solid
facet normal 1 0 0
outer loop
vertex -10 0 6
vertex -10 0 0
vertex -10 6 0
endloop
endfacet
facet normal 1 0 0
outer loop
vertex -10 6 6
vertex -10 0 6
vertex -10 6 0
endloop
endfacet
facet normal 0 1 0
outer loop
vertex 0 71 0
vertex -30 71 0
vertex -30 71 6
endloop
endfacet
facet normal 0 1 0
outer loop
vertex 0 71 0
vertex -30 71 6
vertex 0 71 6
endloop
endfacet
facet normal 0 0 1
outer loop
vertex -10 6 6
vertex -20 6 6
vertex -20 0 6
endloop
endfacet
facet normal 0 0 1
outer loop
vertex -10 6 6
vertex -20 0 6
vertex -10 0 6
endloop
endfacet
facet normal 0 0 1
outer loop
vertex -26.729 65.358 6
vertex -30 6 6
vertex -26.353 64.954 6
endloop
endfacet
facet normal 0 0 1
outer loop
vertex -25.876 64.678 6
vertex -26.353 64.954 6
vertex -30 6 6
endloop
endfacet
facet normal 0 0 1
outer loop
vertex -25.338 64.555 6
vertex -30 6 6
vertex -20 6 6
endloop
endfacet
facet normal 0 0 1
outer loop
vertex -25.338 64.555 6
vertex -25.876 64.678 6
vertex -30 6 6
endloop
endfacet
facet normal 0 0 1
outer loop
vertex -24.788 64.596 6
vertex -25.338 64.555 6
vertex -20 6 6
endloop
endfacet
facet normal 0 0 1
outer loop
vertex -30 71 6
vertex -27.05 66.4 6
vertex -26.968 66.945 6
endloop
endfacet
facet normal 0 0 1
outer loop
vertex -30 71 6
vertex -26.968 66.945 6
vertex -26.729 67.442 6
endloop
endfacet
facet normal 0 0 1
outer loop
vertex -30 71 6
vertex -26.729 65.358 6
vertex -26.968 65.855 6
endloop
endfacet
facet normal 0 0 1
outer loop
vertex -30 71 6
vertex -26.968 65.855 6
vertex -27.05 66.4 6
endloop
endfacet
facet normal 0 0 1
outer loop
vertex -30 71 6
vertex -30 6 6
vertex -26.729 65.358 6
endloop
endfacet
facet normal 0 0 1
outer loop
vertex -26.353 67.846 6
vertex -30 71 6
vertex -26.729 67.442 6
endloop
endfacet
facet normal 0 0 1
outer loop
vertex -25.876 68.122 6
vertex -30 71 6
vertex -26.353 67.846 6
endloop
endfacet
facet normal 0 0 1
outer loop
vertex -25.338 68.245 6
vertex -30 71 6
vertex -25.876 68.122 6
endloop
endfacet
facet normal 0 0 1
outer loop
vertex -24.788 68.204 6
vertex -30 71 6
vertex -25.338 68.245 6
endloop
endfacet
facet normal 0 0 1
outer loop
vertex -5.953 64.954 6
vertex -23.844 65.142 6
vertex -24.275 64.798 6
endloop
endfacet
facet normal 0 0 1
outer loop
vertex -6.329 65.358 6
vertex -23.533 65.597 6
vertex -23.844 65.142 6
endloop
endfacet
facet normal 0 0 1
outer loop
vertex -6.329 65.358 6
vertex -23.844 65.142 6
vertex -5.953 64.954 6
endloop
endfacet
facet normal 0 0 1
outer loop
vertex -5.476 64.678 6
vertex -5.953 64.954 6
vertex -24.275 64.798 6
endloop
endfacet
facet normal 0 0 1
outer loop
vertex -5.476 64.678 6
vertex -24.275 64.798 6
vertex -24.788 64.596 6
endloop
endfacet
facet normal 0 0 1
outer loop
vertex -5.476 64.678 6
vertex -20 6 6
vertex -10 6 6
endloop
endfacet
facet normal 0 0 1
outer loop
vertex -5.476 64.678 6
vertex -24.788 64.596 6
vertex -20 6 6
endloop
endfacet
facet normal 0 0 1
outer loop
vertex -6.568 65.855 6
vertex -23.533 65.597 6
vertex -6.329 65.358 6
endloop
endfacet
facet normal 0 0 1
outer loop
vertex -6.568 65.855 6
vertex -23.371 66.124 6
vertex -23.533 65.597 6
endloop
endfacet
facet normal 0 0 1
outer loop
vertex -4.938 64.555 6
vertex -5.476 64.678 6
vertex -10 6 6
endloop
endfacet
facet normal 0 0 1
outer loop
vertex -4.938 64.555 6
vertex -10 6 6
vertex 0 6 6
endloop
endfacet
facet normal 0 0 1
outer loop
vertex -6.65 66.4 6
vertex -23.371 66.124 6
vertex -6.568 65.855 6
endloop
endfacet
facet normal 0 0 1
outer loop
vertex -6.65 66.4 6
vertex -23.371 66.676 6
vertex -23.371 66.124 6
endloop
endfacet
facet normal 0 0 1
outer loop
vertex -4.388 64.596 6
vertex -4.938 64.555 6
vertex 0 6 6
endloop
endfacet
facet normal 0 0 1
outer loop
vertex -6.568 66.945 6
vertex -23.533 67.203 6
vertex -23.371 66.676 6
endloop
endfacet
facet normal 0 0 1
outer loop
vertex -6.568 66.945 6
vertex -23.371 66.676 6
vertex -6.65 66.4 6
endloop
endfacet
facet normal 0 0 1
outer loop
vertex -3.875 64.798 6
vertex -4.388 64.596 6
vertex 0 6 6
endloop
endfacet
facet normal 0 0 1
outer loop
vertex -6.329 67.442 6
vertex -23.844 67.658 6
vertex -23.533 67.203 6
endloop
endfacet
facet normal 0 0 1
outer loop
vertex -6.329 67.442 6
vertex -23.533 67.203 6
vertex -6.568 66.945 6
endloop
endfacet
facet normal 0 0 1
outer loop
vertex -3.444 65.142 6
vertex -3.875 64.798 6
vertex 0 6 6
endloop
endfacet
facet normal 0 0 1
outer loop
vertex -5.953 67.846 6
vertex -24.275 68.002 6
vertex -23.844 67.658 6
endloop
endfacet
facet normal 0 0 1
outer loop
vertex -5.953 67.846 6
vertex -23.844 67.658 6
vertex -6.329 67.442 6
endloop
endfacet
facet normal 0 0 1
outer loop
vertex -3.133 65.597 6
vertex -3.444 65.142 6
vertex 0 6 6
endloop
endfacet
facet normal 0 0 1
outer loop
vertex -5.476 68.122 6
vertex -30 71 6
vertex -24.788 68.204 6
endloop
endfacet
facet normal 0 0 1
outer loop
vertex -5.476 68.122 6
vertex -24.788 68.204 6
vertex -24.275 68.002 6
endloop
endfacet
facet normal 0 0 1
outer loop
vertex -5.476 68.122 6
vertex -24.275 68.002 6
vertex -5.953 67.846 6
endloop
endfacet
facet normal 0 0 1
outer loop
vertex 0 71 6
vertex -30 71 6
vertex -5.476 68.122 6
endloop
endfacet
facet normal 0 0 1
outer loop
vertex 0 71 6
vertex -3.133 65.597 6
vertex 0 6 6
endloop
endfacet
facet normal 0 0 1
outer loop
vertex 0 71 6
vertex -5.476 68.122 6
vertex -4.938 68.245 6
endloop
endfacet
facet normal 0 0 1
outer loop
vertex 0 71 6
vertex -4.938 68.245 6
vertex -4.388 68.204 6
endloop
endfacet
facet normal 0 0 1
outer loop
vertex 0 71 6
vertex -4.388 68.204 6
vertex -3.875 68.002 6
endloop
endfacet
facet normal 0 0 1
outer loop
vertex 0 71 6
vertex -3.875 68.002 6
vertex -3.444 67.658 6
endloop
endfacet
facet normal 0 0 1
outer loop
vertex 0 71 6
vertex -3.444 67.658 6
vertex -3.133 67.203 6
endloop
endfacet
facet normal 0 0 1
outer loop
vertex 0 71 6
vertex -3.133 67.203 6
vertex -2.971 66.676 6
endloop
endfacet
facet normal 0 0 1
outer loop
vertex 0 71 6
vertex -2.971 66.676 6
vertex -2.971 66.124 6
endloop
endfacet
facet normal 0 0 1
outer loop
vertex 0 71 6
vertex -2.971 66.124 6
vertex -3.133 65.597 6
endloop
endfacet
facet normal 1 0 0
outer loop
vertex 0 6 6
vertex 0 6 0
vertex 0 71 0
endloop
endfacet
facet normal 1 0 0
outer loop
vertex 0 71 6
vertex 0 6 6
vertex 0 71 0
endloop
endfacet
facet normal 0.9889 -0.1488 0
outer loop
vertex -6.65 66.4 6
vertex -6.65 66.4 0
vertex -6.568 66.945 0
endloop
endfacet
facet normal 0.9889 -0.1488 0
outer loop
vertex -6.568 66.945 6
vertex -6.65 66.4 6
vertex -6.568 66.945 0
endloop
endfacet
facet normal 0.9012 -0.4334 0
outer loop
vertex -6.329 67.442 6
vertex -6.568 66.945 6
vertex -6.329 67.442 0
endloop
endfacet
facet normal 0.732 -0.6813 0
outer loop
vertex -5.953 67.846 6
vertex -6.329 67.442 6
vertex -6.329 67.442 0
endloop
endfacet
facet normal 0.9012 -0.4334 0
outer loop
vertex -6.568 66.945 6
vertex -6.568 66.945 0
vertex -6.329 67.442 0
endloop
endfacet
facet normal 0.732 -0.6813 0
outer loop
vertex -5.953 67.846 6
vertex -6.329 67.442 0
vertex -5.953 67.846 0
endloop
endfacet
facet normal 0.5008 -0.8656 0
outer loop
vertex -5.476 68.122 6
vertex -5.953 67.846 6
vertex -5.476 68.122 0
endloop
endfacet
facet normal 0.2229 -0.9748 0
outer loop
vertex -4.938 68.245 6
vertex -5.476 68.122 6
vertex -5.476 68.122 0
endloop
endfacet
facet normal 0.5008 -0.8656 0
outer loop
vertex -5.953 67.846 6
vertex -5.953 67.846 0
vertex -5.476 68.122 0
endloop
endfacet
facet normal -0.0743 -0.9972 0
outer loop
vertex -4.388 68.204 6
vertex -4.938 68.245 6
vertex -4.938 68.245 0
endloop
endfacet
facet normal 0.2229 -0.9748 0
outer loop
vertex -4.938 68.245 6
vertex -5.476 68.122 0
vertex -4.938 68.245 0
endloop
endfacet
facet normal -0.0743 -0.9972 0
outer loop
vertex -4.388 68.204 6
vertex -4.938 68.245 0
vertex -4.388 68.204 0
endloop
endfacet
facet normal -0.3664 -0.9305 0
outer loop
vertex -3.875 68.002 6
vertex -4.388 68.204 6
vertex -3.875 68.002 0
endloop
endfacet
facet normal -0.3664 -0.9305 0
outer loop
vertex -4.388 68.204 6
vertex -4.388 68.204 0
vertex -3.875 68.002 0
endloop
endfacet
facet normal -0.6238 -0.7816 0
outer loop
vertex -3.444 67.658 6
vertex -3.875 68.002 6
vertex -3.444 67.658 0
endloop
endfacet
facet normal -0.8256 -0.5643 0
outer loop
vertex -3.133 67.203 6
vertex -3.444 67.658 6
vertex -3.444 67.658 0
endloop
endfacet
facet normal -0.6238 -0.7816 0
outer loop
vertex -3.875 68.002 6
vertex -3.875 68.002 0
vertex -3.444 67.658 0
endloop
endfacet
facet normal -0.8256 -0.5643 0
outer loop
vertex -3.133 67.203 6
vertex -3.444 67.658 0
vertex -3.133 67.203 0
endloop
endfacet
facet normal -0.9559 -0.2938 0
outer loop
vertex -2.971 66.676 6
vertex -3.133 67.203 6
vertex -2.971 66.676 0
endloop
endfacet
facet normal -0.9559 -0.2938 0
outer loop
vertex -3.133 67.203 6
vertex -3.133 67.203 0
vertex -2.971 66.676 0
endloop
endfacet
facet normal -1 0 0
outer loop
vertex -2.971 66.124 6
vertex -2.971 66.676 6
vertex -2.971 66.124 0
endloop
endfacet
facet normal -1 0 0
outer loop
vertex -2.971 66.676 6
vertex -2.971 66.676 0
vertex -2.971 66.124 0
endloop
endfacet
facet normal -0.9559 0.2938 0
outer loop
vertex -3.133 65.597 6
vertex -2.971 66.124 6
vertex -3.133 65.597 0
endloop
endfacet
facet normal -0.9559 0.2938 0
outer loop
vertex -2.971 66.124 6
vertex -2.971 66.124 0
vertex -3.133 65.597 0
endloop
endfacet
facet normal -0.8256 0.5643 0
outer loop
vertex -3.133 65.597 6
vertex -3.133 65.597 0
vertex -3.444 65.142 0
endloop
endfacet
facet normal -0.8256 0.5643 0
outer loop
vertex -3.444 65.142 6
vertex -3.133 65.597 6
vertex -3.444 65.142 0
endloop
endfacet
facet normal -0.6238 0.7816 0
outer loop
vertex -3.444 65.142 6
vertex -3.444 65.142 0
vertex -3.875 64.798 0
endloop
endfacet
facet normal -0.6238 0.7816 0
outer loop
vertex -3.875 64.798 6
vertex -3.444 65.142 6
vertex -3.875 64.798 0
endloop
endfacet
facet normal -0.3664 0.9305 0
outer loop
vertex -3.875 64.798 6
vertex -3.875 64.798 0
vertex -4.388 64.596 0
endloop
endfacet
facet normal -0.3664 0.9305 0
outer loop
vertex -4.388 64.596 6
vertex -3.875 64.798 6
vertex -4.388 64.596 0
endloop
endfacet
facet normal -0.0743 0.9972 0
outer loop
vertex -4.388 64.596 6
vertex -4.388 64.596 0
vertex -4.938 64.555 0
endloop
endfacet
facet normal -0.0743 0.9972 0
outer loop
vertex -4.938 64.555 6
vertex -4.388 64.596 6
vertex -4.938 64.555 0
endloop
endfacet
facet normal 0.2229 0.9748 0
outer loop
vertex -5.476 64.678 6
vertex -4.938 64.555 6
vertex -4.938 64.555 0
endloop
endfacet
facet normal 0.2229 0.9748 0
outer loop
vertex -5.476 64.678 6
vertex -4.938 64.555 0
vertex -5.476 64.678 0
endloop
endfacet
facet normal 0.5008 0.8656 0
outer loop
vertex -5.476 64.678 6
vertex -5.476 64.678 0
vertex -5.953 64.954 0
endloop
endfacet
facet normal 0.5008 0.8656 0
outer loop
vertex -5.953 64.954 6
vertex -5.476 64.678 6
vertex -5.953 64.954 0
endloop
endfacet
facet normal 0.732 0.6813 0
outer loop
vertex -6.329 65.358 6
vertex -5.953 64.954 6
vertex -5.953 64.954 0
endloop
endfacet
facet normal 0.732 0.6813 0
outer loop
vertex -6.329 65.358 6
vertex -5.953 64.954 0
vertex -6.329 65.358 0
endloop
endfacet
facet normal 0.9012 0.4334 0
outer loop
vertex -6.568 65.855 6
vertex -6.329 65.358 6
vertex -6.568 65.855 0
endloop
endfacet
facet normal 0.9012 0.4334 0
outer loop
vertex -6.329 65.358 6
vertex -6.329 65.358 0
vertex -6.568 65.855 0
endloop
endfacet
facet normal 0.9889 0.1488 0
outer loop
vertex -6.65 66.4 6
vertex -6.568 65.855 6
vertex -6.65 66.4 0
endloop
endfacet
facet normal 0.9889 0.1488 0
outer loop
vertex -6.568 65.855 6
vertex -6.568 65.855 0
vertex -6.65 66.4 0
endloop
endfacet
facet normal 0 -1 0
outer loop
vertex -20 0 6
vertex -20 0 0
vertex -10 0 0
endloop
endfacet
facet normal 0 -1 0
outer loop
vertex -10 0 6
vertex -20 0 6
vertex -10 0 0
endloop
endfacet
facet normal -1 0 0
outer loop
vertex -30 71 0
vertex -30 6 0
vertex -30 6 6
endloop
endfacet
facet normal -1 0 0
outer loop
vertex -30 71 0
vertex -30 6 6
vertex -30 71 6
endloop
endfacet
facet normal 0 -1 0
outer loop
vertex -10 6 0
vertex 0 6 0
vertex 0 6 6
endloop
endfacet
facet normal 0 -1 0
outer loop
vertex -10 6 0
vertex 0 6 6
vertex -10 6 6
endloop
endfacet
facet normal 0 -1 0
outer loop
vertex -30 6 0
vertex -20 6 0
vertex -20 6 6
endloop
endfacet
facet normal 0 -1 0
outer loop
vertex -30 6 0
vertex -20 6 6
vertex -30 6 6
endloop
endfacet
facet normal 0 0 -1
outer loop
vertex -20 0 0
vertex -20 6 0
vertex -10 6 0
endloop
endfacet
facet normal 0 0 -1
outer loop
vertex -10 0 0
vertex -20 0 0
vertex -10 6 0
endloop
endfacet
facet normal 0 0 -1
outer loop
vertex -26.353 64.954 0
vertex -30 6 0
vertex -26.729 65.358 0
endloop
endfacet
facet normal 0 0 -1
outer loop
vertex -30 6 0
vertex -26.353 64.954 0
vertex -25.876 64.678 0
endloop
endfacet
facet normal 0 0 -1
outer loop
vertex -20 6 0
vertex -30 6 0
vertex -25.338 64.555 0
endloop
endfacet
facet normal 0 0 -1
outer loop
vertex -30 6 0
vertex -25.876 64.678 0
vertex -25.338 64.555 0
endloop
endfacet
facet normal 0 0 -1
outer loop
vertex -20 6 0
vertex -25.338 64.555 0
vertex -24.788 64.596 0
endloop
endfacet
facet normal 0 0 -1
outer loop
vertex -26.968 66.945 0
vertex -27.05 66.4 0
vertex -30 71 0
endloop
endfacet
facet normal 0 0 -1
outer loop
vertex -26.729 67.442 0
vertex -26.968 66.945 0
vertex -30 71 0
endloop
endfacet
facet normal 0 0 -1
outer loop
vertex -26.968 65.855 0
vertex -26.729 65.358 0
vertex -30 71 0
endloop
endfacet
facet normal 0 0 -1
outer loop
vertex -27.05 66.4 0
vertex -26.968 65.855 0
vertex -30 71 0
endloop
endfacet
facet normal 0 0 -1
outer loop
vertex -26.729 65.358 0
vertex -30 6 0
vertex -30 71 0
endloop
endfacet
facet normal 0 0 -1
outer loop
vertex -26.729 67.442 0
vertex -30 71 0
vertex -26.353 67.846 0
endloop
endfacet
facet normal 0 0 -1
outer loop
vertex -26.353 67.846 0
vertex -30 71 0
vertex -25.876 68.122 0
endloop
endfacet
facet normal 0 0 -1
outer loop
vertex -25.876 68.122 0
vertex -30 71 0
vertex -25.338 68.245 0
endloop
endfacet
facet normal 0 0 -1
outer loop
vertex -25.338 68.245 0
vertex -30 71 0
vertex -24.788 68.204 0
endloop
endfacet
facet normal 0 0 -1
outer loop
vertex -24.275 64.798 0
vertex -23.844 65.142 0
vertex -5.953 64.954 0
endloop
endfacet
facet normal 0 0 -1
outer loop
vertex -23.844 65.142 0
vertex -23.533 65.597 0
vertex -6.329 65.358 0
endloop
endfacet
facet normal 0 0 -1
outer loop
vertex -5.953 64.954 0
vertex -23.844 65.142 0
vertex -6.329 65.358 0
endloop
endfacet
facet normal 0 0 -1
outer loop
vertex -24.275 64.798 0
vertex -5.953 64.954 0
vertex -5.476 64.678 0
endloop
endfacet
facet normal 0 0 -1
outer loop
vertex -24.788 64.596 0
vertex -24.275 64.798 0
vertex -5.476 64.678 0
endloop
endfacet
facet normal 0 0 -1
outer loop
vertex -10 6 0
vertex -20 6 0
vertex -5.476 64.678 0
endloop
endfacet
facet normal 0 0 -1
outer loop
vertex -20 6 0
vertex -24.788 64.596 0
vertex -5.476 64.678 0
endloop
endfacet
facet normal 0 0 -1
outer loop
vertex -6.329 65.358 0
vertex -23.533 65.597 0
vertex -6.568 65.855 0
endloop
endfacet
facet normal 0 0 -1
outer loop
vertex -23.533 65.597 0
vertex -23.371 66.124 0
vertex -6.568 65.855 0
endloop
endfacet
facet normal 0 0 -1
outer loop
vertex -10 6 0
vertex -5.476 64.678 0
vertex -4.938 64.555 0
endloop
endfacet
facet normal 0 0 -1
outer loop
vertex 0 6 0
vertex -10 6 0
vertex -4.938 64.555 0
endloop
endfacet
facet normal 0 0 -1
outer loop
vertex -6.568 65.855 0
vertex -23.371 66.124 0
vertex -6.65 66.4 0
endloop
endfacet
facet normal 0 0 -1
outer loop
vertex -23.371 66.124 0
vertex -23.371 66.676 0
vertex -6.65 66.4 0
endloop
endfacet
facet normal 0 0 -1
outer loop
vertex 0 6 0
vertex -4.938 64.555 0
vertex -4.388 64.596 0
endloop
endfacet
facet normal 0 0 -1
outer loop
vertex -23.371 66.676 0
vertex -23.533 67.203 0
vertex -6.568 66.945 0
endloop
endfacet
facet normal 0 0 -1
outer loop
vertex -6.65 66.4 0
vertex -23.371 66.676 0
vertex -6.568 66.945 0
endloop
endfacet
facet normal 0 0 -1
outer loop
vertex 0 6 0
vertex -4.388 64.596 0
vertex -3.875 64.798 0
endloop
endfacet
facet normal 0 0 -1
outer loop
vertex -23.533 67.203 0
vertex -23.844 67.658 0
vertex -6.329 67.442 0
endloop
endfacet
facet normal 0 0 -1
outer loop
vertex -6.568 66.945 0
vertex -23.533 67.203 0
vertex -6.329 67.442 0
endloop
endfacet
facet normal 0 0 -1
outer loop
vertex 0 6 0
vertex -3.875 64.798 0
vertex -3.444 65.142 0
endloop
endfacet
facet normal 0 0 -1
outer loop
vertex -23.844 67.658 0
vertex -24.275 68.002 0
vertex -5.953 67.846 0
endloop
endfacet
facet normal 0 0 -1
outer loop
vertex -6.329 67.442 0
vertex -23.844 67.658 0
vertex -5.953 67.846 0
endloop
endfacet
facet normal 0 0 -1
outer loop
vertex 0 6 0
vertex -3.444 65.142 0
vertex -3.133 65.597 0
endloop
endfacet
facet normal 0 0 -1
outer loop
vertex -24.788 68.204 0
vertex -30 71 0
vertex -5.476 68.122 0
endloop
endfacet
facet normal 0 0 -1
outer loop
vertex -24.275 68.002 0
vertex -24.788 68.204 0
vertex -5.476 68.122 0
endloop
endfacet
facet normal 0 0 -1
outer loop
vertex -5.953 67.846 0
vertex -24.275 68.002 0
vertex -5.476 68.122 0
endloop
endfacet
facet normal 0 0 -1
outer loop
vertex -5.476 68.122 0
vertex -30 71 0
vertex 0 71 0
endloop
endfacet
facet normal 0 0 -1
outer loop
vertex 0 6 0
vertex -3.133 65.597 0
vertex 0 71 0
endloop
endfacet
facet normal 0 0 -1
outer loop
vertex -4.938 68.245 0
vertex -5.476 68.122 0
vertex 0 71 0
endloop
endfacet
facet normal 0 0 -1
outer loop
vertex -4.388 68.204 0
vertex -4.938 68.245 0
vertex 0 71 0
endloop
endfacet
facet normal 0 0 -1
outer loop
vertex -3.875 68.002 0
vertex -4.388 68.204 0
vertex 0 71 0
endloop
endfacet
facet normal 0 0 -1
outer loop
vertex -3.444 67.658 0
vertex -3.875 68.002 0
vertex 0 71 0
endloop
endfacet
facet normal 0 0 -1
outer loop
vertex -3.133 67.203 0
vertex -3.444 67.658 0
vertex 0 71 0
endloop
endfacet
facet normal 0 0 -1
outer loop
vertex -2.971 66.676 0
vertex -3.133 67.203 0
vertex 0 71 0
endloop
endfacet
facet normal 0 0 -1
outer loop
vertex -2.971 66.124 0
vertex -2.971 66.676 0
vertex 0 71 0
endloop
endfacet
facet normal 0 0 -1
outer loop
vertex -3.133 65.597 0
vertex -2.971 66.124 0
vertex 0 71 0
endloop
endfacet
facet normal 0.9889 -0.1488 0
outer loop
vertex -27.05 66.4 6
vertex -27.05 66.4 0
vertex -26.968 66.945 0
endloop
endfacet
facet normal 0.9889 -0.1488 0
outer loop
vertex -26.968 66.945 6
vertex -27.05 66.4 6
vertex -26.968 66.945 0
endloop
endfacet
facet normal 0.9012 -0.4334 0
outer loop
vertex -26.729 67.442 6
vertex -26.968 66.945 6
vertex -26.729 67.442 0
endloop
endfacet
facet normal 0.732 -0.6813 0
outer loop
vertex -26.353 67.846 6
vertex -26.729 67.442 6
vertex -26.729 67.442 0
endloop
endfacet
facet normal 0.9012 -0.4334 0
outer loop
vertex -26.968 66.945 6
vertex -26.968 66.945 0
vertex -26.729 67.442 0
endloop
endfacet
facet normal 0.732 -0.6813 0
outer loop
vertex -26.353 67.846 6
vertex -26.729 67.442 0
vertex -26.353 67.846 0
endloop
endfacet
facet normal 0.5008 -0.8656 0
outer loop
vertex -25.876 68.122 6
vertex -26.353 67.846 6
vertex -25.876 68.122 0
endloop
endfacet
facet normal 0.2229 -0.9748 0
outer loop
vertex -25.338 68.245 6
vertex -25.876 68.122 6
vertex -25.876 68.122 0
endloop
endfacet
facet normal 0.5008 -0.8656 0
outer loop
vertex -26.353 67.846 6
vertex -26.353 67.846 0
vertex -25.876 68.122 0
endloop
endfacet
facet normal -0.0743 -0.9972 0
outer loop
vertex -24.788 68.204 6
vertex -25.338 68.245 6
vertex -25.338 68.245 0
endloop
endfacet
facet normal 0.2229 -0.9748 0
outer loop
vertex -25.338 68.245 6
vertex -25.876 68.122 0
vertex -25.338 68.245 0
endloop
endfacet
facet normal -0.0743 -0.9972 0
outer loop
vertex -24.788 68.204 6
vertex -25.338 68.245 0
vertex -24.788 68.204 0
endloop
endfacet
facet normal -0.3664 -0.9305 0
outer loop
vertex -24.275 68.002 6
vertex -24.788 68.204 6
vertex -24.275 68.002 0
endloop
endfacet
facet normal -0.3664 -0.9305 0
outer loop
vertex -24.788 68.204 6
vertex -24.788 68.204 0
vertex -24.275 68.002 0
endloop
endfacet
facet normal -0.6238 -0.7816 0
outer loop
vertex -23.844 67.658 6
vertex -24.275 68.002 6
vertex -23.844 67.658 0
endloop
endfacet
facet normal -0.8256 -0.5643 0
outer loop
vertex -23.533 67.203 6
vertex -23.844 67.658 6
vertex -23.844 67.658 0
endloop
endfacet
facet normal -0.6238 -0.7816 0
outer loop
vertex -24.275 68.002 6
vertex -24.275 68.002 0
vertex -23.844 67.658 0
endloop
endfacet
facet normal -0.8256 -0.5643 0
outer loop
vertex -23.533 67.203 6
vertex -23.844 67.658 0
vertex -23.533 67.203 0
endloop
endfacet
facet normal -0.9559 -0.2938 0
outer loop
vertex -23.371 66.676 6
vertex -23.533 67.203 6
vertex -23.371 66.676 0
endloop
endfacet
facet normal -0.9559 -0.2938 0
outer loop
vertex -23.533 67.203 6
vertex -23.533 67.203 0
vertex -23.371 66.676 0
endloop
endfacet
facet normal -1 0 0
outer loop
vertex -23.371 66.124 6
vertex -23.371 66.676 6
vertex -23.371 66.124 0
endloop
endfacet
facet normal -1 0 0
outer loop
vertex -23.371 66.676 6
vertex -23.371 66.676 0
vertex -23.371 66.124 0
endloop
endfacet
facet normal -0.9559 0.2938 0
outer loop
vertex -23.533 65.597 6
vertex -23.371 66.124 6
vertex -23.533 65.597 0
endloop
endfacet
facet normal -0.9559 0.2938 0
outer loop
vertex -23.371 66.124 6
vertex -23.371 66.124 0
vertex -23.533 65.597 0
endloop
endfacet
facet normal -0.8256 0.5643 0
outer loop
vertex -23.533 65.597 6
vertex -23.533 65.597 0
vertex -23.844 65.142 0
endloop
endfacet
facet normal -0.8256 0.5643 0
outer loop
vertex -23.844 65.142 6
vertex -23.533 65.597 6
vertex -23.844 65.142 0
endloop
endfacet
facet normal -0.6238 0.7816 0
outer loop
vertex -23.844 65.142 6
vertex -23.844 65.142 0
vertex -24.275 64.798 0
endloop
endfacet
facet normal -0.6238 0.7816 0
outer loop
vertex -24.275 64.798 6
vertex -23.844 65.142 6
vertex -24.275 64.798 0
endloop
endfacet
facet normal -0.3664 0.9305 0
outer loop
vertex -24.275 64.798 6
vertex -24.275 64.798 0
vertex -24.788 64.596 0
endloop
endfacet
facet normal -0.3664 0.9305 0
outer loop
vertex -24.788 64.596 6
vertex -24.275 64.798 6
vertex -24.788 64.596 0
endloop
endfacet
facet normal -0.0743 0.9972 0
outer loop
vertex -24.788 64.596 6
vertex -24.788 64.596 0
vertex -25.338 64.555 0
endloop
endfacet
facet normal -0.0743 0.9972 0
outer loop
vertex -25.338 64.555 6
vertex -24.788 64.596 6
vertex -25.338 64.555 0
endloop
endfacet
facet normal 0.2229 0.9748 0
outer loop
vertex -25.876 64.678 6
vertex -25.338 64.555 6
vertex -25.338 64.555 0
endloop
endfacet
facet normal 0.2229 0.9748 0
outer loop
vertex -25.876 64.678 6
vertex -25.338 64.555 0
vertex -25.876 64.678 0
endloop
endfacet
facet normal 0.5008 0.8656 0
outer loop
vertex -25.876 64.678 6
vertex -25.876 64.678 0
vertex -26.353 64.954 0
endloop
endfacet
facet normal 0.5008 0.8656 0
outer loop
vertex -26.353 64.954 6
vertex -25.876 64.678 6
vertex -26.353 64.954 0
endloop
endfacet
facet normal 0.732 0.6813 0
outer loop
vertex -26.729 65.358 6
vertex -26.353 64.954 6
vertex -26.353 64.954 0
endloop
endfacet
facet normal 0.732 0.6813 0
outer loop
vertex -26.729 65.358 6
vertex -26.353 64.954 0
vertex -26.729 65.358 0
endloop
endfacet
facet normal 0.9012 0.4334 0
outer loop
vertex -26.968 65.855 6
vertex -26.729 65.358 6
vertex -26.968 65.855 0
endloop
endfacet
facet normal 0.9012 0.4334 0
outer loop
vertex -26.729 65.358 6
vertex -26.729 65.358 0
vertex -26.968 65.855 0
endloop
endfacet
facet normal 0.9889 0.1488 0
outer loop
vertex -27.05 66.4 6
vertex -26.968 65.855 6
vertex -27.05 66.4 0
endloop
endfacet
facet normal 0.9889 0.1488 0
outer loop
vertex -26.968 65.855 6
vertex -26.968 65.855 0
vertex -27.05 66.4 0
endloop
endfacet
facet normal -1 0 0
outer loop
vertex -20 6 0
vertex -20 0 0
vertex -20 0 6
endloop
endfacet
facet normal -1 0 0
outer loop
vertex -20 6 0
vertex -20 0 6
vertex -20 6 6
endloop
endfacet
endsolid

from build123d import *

# Parameters (mm, degrees)
ESQUISSE1_W             = 30
ESQUISSE1_H             = 71
BOSS_EXTRU_1_DEPTH      = 6
ESQUISSE3_R             = 1.85
ESQUISSE3_W             = 10
ESQUISSE3_H             = 6
ENL_V_MAT_EXTRU_1_DEPTH = 6


with BuildPart() as part:
    # Esquisse1 → Boss.-Extru.1 (new body)
    with BuildSketch(Plane.XY):
        with Locations((-15, 35.5)):
            Rectangle(ESQUISSE1_W, ESQUISSE1_H)
    extrude(amount=BOSS_EXTRU_1_DEPTH)

    # Esquisse3 → Enlèv. mat.-Extru.1 (cut)
    with BuildSketch(Plane(origin=(0, 0, 0), x_dir=(-1, 0, 0), z_dir=(0, 0, -1))):
        with Locations((4.8, 66.4)):
            Circle(ESQUISSE3_R)
        with Locations((25.2, 66.4)):
            Circle(ESQUISSE3_R)
        with Locations((5, 3)):
            Rectangle(ESQUISSE3_W, ESQUISSE3_H)
        with Locations((25, 3)):
            Rectangle(ESQUISSE3_W, ESQUISSE3_H)
    extrude(amount=-ENL_V_MAT_EXTRU_1_DEPTH, mode=Mode.SUBTRACT)


solid = part.part
